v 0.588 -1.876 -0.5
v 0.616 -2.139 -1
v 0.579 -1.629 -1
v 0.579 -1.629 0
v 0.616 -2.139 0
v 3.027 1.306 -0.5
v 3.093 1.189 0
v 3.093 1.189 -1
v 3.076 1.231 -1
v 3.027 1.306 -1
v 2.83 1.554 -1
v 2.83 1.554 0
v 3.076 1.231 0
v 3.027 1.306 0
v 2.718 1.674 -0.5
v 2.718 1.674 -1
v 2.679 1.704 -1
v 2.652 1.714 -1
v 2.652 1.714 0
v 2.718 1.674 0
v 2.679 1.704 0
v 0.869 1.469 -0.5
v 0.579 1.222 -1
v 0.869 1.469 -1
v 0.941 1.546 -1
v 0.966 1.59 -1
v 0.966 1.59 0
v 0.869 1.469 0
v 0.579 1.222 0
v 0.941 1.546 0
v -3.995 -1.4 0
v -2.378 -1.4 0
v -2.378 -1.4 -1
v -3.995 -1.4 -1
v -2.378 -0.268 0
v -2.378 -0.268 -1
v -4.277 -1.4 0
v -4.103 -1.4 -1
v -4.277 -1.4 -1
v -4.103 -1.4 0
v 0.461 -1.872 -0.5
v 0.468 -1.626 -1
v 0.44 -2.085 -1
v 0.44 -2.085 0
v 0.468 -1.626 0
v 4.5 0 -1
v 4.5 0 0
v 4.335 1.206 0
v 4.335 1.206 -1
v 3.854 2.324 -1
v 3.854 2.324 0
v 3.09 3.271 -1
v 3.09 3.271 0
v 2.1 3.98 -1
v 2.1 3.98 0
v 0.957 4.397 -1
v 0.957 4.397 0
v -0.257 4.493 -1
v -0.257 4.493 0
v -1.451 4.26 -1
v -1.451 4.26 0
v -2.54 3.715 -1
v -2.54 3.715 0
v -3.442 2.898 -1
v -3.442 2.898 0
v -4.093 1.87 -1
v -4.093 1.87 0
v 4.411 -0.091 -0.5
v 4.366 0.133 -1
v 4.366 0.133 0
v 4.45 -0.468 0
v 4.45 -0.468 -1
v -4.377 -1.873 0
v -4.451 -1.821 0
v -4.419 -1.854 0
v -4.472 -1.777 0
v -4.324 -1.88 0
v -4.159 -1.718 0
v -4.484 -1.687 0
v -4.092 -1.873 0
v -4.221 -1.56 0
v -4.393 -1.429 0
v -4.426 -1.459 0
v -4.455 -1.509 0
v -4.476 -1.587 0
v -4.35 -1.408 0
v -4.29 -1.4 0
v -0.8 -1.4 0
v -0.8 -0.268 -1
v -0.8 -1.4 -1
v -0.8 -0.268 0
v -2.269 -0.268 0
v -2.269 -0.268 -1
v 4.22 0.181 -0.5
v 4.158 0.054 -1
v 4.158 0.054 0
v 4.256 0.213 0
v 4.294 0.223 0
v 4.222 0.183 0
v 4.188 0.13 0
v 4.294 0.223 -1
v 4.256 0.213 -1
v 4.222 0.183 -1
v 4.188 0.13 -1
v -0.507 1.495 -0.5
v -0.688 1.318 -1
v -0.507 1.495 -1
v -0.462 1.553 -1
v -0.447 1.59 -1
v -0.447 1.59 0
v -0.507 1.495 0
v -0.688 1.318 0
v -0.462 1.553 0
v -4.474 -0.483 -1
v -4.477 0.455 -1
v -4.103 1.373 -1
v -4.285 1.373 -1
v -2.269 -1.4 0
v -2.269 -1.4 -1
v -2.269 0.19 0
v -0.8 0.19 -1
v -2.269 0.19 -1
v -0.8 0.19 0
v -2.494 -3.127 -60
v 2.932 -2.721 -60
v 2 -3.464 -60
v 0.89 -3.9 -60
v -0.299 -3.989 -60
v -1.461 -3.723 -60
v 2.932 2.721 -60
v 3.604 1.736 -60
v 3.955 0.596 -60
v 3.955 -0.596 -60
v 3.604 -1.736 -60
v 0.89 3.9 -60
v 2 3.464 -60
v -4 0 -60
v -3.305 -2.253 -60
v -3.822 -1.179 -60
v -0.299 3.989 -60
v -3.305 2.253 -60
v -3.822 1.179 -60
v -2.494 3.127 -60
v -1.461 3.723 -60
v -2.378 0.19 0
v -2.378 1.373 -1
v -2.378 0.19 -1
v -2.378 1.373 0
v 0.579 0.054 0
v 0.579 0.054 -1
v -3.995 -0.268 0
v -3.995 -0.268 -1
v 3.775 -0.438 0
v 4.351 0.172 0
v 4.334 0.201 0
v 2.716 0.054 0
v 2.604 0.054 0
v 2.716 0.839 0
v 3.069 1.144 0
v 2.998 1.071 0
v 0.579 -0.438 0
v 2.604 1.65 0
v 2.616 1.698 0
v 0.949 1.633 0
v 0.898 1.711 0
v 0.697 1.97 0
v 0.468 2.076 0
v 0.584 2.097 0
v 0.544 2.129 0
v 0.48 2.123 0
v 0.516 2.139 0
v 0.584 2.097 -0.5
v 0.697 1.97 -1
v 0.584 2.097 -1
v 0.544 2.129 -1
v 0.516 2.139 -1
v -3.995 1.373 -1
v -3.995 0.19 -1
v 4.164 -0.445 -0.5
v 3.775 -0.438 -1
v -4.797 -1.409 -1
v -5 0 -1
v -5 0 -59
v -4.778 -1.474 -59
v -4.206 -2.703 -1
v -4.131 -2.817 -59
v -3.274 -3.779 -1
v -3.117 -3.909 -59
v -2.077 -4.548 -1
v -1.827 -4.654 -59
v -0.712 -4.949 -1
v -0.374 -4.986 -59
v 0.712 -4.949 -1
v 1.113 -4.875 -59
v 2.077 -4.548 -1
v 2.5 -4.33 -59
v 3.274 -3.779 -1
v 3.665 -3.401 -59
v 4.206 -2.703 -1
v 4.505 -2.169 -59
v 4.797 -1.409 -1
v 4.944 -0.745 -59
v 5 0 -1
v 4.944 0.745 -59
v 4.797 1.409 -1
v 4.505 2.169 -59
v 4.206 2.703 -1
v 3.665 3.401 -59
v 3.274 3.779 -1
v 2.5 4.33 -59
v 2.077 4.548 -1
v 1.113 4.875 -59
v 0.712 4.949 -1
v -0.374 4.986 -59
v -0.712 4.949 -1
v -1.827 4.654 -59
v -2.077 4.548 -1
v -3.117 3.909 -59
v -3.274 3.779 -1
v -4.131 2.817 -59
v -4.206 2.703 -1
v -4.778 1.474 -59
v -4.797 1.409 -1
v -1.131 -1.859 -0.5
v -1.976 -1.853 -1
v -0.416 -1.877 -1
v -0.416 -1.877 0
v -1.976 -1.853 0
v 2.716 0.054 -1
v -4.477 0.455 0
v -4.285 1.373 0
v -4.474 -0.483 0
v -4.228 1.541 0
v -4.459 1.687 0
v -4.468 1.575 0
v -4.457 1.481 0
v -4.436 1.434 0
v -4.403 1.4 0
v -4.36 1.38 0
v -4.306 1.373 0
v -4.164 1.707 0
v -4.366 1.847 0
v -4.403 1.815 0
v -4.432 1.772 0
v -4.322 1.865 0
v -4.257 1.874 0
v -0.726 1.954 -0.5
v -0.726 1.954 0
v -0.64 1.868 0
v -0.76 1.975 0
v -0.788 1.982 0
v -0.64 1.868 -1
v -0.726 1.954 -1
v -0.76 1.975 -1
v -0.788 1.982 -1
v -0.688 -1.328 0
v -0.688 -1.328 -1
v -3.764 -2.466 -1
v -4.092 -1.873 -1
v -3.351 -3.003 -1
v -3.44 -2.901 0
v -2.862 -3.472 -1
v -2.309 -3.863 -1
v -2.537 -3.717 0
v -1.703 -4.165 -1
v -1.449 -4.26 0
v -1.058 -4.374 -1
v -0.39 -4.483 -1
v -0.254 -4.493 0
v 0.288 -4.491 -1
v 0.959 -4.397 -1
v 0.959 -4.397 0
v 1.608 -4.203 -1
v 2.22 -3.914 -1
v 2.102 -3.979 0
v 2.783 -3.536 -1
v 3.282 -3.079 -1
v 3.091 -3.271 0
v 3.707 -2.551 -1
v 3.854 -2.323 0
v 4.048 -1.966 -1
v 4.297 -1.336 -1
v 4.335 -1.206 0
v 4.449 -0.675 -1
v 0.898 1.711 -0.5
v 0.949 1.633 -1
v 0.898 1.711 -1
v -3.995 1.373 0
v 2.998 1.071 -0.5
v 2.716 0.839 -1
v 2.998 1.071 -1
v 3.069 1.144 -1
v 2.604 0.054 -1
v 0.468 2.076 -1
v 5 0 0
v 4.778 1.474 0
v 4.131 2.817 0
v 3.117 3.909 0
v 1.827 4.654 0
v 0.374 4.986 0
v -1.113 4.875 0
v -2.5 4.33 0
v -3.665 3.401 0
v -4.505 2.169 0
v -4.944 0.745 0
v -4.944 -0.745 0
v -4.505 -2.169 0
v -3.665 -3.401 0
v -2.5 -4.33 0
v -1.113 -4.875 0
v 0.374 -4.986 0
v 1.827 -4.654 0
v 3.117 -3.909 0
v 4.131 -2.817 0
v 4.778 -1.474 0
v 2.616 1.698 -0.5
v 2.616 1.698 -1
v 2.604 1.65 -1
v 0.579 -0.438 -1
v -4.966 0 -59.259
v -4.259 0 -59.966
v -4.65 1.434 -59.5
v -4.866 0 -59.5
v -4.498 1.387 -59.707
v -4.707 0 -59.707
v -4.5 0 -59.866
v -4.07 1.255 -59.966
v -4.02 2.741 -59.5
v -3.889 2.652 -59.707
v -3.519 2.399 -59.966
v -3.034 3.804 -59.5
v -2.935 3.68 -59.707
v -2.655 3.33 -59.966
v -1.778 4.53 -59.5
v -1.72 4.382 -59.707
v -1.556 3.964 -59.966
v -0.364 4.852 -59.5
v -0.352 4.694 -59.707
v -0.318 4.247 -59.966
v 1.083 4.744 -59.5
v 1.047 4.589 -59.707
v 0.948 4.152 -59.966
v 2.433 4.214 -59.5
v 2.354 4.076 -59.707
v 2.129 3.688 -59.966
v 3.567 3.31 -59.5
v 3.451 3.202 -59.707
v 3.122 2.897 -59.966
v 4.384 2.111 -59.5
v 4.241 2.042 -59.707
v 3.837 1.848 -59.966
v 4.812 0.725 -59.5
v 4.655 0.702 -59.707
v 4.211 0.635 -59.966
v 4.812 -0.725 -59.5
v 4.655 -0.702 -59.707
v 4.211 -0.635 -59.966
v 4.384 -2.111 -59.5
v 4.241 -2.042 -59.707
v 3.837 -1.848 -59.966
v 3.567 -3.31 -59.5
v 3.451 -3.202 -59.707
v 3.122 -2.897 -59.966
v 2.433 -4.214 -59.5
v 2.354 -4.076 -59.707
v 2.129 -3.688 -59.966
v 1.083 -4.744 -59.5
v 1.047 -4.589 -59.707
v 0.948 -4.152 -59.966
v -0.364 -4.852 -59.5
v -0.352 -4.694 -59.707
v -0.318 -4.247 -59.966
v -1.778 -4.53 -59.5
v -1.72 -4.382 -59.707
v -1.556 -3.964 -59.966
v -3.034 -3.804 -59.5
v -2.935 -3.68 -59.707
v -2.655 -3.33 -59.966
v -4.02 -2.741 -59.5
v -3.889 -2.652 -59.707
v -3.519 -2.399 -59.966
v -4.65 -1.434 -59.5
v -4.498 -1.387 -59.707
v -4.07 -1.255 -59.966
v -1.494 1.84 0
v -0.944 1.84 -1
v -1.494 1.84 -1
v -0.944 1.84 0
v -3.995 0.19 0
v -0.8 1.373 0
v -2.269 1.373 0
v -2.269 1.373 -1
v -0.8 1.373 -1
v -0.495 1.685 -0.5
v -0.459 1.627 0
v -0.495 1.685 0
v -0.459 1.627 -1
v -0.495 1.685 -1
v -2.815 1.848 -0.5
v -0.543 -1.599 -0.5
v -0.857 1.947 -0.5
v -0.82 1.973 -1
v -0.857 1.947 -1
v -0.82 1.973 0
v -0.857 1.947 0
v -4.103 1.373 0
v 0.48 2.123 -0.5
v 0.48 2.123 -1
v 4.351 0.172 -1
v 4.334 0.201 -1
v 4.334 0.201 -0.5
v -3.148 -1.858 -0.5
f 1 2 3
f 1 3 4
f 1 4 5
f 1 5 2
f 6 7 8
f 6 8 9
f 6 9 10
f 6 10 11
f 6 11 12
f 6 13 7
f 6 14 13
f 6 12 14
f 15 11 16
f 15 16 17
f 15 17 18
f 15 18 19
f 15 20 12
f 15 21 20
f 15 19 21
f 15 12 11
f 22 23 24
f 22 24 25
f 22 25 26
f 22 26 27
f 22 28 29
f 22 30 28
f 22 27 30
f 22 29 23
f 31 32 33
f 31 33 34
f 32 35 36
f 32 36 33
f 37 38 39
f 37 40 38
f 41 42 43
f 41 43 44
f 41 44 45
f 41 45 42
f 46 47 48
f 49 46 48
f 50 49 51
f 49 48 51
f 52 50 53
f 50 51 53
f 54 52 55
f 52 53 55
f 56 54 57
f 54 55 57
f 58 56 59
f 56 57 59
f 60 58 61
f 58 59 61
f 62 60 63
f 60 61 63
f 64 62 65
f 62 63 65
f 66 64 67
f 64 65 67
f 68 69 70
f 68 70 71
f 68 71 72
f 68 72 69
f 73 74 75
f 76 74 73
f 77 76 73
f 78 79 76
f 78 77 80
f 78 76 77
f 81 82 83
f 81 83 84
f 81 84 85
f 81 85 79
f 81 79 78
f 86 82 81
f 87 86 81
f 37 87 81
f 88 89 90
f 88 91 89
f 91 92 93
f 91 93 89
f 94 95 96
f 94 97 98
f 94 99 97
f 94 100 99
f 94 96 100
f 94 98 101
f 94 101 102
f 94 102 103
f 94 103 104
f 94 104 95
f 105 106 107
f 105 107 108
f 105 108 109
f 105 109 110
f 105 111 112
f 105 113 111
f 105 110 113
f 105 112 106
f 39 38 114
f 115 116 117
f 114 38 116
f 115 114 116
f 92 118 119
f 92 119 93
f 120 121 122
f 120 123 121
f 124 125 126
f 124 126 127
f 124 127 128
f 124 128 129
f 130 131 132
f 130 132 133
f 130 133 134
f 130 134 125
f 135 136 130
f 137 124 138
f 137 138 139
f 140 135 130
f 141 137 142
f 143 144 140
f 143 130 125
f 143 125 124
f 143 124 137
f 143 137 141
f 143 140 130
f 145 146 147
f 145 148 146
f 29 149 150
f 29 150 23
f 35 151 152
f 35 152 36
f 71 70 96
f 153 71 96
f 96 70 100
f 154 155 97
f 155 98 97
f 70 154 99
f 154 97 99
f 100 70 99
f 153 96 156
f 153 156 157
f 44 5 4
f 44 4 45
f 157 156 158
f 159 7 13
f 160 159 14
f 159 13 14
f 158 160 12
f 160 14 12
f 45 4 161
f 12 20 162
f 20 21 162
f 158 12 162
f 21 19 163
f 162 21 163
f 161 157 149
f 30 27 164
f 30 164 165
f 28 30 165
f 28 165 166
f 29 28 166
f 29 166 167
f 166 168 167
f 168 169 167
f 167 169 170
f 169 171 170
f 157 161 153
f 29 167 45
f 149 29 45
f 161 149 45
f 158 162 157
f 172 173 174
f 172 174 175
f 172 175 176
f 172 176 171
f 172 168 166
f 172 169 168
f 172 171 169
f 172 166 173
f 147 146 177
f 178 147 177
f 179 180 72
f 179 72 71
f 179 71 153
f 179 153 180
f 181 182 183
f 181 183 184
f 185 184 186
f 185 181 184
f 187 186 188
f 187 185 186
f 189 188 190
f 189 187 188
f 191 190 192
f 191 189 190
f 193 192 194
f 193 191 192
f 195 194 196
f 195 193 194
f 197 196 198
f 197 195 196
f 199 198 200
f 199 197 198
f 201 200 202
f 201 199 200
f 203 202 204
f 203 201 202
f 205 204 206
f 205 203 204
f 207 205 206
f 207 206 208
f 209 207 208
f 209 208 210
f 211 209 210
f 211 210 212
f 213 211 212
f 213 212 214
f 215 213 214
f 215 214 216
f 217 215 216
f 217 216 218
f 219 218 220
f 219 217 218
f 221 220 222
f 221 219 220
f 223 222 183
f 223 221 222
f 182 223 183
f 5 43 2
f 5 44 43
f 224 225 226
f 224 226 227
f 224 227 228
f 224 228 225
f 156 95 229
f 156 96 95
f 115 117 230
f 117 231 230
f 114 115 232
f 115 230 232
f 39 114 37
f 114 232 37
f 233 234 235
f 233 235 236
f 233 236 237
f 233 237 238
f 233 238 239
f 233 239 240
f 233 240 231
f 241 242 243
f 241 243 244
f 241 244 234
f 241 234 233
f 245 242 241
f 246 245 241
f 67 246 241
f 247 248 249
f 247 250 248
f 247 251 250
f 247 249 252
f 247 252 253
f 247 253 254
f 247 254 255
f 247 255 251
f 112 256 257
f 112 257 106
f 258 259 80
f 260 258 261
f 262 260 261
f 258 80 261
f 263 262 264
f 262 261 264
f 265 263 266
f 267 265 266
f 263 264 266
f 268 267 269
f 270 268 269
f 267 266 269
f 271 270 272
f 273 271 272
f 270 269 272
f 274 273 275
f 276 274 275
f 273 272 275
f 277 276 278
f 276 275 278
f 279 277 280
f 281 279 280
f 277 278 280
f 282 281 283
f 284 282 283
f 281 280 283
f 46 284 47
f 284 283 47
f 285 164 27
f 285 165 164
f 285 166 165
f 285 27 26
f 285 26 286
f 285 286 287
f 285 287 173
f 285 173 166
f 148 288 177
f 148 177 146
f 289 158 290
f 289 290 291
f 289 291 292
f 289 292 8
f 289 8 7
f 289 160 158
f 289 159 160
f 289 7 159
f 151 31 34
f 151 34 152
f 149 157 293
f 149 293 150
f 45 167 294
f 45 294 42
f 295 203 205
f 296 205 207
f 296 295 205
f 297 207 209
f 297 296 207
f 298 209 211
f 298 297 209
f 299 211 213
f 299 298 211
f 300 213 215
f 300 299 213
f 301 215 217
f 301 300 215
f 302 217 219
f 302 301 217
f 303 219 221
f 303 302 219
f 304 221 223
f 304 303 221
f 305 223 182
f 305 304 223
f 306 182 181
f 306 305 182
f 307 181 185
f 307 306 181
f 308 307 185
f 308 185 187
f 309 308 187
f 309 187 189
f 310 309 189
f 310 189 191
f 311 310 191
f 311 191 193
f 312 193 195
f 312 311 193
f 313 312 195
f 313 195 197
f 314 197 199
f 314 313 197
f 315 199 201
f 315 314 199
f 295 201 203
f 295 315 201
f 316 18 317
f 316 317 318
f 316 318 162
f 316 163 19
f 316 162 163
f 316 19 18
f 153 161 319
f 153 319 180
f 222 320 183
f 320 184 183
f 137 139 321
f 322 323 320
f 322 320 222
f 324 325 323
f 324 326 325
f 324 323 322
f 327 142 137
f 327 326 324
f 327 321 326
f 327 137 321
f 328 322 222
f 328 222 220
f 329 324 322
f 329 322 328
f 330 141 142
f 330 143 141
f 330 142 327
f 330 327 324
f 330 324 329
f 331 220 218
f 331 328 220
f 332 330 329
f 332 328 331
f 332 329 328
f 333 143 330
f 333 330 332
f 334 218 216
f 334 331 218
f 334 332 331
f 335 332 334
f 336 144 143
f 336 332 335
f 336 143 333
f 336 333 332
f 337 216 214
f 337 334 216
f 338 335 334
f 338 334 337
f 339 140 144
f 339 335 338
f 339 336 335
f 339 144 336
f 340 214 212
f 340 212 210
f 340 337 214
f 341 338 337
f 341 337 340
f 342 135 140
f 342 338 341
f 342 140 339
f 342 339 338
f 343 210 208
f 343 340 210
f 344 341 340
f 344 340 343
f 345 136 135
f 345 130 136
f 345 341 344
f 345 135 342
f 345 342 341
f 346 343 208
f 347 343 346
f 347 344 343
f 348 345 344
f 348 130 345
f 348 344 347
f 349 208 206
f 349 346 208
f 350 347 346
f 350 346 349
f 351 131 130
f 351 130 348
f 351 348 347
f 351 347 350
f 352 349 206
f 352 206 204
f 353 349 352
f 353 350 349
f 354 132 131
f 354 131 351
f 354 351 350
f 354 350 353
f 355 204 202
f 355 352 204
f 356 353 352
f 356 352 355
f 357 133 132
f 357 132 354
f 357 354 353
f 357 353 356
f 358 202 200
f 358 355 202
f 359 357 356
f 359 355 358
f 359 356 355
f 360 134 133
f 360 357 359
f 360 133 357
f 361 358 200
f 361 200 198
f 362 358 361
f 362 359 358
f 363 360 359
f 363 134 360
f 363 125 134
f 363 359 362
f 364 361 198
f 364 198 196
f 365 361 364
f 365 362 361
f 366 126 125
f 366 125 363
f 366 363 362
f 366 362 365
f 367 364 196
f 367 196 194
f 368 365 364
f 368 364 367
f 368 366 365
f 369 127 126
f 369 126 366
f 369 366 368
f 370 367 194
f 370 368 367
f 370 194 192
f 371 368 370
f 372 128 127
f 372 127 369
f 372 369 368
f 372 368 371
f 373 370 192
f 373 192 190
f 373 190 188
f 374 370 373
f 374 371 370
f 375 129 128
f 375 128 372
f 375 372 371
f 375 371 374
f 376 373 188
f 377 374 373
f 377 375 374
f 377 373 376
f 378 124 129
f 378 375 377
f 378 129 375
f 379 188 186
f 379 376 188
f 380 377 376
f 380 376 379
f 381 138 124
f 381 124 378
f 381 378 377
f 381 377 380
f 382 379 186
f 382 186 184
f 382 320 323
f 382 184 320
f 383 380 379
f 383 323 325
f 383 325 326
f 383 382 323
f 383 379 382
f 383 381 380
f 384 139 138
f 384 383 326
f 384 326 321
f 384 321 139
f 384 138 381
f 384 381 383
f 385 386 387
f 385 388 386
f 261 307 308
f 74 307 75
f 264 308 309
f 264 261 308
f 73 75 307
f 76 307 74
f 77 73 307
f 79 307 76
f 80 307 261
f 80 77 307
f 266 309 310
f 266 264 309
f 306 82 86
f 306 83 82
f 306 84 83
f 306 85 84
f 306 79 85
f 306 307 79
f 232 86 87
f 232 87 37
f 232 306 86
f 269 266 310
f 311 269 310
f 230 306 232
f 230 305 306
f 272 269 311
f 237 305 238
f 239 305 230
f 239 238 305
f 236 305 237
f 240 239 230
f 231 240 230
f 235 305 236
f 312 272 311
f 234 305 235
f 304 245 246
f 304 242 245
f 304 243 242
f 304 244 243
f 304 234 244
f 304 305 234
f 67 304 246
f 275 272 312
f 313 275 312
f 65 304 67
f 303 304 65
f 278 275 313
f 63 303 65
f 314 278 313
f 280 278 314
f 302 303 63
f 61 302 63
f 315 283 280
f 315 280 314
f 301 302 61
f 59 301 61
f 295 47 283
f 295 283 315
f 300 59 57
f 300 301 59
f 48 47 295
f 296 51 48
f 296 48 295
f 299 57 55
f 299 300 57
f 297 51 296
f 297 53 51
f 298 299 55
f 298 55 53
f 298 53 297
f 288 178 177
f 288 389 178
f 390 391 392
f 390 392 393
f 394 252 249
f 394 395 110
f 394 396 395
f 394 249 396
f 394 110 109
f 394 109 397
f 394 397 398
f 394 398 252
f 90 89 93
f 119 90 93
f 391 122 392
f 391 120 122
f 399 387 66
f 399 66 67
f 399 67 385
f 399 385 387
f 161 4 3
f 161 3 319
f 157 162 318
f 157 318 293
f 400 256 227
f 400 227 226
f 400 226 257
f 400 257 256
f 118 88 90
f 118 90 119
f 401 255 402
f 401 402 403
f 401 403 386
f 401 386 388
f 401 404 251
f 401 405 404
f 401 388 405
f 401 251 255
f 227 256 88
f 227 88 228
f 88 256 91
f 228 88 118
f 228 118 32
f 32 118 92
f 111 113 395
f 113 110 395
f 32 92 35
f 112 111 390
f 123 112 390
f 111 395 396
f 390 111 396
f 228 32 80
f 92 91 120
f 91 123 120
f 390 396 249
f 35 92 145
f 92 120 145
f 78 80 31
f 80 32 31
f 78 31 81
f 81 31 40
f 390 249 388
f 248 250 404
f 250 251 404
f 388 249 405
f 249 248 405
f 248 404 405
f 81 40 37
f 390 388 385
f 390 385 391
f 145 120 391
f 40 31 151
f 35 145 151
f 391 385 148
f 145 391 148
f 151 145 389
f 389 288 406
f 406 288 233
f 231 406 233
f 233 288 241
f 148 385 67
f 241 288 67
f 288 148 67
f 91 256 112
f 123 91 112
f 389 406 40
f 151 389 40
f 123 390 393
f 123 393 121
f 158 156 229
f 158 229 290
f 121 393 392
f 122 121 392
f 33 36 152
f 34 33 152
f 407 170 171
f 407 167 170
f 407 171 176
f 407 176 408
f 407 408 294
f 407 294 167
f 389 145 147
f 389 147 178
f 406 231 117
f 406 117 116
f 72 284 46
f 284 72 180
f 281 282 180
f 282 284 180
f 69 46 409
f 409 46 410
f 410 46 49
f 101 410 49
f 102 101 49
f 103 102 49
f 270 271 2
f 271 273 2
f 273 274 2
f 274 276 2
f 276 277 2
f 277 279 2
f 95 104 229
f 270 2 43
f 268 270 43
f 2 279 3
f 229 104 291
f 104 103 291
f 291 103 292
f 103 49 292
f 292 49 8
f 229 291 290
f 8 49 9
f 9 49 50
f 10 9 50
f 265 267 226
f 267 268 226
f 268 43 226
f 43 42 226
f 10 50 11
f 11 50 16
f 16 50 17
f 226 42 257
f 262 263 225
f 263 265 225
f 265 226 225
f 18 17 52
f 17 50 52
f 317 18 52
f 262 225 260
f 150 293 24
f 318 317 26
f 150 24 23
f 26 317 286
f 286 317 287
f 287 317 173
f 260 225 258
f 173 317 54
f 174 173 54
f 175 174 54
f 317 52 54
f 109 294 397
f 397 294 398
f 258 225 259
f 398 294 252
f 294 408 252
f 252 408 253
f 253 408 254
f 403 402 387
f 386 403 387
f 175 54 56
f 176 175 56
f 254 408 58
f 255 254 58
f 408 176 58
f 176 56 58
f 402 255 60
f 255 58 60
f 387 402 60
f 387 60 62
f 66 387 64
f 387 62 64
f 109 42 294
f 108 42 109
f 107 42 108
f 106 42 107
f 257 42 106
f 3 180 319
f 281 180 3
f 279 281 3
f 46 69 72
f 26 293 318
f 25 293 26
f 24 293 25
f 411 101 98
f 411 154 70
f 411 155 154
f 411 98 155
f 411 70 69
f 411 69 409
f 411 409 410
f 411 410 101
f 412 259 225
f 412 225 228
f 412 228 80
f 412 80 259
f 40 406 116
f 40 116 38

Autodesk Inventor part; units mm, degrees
ref_plane "YZ Plane" through (0, 0, 0) normal (1, 0, 0) x (0, 1, 0)
ref_plane "XZ Plane" through (0, 0, 0) normal (0, 1, 0) x (-1, 0, 0)
sketch "スケッチ1" plane through (0, 0, 0) normal (0, 0, 1) x (1, 0, 0)
  circle A0 centre (0, 0) radius 5
  circle A1 centre (0, 0) radius 4.5
  dimension "d0" = 10
  dimension "d10" = 9
ref_plane "作業平面1" through (0, 0, 0) normal (0, 0, -1) x (-1, 0, 0)
sketch "スケッチ2" plane through (0, 0, 0) normal (0, 0, -1) x (-1, 0, 0)
  line L0 (-5.5874, 2.4478) -> (5.5874, 2.4478) construction
  line L1 (5.5874, 2.4478) -> (5.5874, -2.4478) construction
  line L2 (5.5874, -2.4478) -> (-5.5874, -2.4478) construction
  line L3 (-5.5874, -2.4478) -> (-5.5874, 2.4478) construction
  line L4 (5.5874, 2.4478) -> (-5.5874, -2.4478) construction
  line L5 (5.5874, -2.4478) -> (-5.5874, 2.4478) construction
  line L6 (-2.6039, 0.0543) -> (-0.5793, 0.0543)
  line L7 (-0.5793, 0.0543) -> (-0.5793, 1.222)
  spline S0 degree 2 poles (-0.5793, 1.222) (-0.9655, 1.5328) (-0.9655, 1.5901) knots 0 0 0 1 1 1
  spline S1 degree 2 poles (-0.9655, 1.5901) (-0.9655, 1.6414) (-0.697, 1.9703) knots 0 0 0 1 1 1
  spline S2 degree 2 poles (-0.697, 1.9703) (-0.5612, 2.1392) (-0.5159, 2.1392) knots 0 0 0 1 1 1
  spline S3 degree 2 poles (-0.5159, 2.1392) (-0.4677, 2.1392) (-0.4677, 2.0759) knots 0 0 0 1 1 1
  line L8 (-0.4677, 2.0759) -> (-0.4677, -1.6263)
  spline S4 degree 2 poles (-0.4677, -1.6263) (-0.4677, -1.8888) (-0.4405, -2.0849) knots 0 0 0 1 1 1
  line L9 (-0.4405, -2.0849) -> (-0.6155, -2.1392)
  spline S5 degree 2 poles (-0.6155, -2.1392) (-0.5793, -1.8677) (-0.5793, -1.6293) knots 0 0 0 1 1 1
  line L10 (-0.5793, -1.6293) -> (-0.5793, -0.4375)
  line L11 (-0.5793, -0.4375) -> (-3.7746, -0.4375)
  spline S6 degree 2 poles (-3.7746, -0.4375) (-4.2151, -0.4375) (-4.4504, -0.4677) knots 0 0 0 1 1 1
  spline S7 degree 2 poles (-4.4504, -0.4677) (-4.4142, -0.0151) (-4.3659, 0.1328) knots 0 0 0 1 1 1
  spline S8 degree 2 poles (-4.3659, 0.1328) (-4.3388, 0.2233) (-4.2935, 0.2233) knots 0 0 0 1 1 1
  spline S9 degree 2 poles (-4.2935, 0.2233) (-4.2151, 0.2233) (-4.1578, 0.0543) knots 0 0 0 1 1 1
  line L12 (-4.1578, 0.0543) -> (-2.7155, 0.0543)
  line L13 (-2.7155, 0.0543) -> (-2.7155, 0.8388)
  spline S10 degree 2 poles (-2.7155, 0.8388) (-3.0927, 1.1284) (-3.0927, 1.1888) knots 0 0 0 1 1 1
  spline S11 degree 2 poles (-3.0927, 1.1888) (-3.0927, 1.2401) (-2.8302, 1.5539) knots 0 0 0 1 1 1
  spline S12 degree 2 poles (-2.8302, 1.5539) (-2.6944, 1.7138) (-2.6522, 1.7138) knots 0 0 0 1 1 1
  spline S13 degree 2 poles (-2.6522, 1.7138) (-2.6039, 1.7138) (-2.6039, 1.6504) knots 0 0 0 1 1 1
  line L14 (-2.6039, 1.6504) -> (-2.6039, 0.0543)
  line L15 (4.1034, -1.4) -> (4.2905, -1.4)
  spline S14 degree 2 poles (4.2905, -1.4) (4.4836, -1.4) (4.4836, -1.6866) knots 0 0 0 1 1 1
  spline S15 degree 2 poles (4.4836, -1.6866) (4.4836, -1.8797) (4.3237, -1.8797) knots 0 0 0 1 1 1
  spline S16 degree 2 poles (4.3237, -1.8797) (3.4487, -1.8526) (1.9763, -1.8526) knots 0 0 0 1 1 1
  spline S17 degree 2 poles (1.9763, -1.8526) (1.0651, -1.8526) (0.4164, -1.8767) knots 0 0 0 1 1 1
  spline S18 degree 2 poles (0.4164, -1.8767) (0.5341, -1.5961) (0.6879, -1.3276) knots 0 0 0 1 1 1
  line L16 (0.6879, -1.3276) -> (0.6879, 1.3185)
  spline S19 degree 2 poles (0.6879, 1.3185) (0.4466, 1.5358) (0.4466, 1.5901) knots 0 0 0 1 1 1
  spline S20 degree 2 poles (0.4466, 1.5901) (0.4466, 1.6414) (0.6397, 1.8677) knots 0 0 0 1 1 1
  spline S21 degree 2 poles (0.6397, 1.8677) (0.7392, 1.9823) (0.7875, 1.9823) knots 0 0 0 1 1 1
  spline S22 degree 2 poles (0.7875, 1.9823) (0.8478, 1.9823) (0.9444, 1.8405) knots 0 0 0 1 1 1
  line L17 (0.9444, 1.8405) -> (1.4935, 1.8405)
  spline S23 degree 2 poles (1.4935, 1.8405) (2.9237, 1.8405) (4.2573, 1.8737) knots 0 0 0 1 1 1
  spline S24 degree 2 poles (4.2573, 1.8737) (4.4685, 1.8737) (4.4685, 1.575) knots 0 0 0 1 1 1
  spline S25 degree 2 poles (4.4685, 1.575) (4.4685, 1.3728) (4.3056, 1.3728) knots 0 0 0 1 1 1
  line L18 (4.3056, 1.3728) -> (4.1034, 1.3728)
  line L19 (4.1034, 1.3728) -> (4.1034, -1.4)
  line L20 (3.9948, 1.3728) -> (2.3776, 1.3728)
  line L21 (2.3776, 1.3728) -> (2.3776, 0.1901)
  line L22 (2.3776, 0.1901) -> (3.9948, 0.1901)
  line L23 (3.9948, 0.1901) -> (3.9948, 1.3728)
  line L24 (2.3776, -1.4) -> (3.9948, -1.4)
  line L25 (3.9948, -1.4) -> (3.9948, -0.2685)
  line L26 (3.9948, -0.2685) -> (2.3776, -0.2685)
  line L27 (2.3776, -0.2685) -> (2.3776, -1.4)
  line L28 (2.269, 1.3728) -> (0.7996, 1.3728)
  line L29 (0.7996, 1.3728) -> (0.7996, 0.1901)
  line L30 (0.7996, 0.1901) -> (2.269, 0.1901)
  line L31 (2.269, 0.1901) -> (2.269, 1.3728)
  line L32 (2.269, -1.4) -> (2.269, -0.2685)
  line L33 (2.269, -0.2685) -> (0.7996, -0.2685)
  line L34 (0.7996, -0.2685) -> (0.7996, -1.4)
  line L35 (0.7996, -1.4) -> (2.269, -1.4)
  point P0 (0, 0)
  point P1 (0, 0)
extrude "押し出し5" add sketch "スケッチ1" against normal blind 1
sketch "スケッチ3" plane through (0, 0, -1) normal (0, 0, -1) x (-1, 0, 0)
  circle A0 centre (0, 0) radius 5
extrude "押し出し6" add sketch "スケッチ3" along normal blind 59
fillet "フィレット2" radius 1 1 edges at (5, 0, -60)
extrude "押し出し9" add sketch "スケッチ2" along normal blind 1
properties part number "ueda_hanko"
